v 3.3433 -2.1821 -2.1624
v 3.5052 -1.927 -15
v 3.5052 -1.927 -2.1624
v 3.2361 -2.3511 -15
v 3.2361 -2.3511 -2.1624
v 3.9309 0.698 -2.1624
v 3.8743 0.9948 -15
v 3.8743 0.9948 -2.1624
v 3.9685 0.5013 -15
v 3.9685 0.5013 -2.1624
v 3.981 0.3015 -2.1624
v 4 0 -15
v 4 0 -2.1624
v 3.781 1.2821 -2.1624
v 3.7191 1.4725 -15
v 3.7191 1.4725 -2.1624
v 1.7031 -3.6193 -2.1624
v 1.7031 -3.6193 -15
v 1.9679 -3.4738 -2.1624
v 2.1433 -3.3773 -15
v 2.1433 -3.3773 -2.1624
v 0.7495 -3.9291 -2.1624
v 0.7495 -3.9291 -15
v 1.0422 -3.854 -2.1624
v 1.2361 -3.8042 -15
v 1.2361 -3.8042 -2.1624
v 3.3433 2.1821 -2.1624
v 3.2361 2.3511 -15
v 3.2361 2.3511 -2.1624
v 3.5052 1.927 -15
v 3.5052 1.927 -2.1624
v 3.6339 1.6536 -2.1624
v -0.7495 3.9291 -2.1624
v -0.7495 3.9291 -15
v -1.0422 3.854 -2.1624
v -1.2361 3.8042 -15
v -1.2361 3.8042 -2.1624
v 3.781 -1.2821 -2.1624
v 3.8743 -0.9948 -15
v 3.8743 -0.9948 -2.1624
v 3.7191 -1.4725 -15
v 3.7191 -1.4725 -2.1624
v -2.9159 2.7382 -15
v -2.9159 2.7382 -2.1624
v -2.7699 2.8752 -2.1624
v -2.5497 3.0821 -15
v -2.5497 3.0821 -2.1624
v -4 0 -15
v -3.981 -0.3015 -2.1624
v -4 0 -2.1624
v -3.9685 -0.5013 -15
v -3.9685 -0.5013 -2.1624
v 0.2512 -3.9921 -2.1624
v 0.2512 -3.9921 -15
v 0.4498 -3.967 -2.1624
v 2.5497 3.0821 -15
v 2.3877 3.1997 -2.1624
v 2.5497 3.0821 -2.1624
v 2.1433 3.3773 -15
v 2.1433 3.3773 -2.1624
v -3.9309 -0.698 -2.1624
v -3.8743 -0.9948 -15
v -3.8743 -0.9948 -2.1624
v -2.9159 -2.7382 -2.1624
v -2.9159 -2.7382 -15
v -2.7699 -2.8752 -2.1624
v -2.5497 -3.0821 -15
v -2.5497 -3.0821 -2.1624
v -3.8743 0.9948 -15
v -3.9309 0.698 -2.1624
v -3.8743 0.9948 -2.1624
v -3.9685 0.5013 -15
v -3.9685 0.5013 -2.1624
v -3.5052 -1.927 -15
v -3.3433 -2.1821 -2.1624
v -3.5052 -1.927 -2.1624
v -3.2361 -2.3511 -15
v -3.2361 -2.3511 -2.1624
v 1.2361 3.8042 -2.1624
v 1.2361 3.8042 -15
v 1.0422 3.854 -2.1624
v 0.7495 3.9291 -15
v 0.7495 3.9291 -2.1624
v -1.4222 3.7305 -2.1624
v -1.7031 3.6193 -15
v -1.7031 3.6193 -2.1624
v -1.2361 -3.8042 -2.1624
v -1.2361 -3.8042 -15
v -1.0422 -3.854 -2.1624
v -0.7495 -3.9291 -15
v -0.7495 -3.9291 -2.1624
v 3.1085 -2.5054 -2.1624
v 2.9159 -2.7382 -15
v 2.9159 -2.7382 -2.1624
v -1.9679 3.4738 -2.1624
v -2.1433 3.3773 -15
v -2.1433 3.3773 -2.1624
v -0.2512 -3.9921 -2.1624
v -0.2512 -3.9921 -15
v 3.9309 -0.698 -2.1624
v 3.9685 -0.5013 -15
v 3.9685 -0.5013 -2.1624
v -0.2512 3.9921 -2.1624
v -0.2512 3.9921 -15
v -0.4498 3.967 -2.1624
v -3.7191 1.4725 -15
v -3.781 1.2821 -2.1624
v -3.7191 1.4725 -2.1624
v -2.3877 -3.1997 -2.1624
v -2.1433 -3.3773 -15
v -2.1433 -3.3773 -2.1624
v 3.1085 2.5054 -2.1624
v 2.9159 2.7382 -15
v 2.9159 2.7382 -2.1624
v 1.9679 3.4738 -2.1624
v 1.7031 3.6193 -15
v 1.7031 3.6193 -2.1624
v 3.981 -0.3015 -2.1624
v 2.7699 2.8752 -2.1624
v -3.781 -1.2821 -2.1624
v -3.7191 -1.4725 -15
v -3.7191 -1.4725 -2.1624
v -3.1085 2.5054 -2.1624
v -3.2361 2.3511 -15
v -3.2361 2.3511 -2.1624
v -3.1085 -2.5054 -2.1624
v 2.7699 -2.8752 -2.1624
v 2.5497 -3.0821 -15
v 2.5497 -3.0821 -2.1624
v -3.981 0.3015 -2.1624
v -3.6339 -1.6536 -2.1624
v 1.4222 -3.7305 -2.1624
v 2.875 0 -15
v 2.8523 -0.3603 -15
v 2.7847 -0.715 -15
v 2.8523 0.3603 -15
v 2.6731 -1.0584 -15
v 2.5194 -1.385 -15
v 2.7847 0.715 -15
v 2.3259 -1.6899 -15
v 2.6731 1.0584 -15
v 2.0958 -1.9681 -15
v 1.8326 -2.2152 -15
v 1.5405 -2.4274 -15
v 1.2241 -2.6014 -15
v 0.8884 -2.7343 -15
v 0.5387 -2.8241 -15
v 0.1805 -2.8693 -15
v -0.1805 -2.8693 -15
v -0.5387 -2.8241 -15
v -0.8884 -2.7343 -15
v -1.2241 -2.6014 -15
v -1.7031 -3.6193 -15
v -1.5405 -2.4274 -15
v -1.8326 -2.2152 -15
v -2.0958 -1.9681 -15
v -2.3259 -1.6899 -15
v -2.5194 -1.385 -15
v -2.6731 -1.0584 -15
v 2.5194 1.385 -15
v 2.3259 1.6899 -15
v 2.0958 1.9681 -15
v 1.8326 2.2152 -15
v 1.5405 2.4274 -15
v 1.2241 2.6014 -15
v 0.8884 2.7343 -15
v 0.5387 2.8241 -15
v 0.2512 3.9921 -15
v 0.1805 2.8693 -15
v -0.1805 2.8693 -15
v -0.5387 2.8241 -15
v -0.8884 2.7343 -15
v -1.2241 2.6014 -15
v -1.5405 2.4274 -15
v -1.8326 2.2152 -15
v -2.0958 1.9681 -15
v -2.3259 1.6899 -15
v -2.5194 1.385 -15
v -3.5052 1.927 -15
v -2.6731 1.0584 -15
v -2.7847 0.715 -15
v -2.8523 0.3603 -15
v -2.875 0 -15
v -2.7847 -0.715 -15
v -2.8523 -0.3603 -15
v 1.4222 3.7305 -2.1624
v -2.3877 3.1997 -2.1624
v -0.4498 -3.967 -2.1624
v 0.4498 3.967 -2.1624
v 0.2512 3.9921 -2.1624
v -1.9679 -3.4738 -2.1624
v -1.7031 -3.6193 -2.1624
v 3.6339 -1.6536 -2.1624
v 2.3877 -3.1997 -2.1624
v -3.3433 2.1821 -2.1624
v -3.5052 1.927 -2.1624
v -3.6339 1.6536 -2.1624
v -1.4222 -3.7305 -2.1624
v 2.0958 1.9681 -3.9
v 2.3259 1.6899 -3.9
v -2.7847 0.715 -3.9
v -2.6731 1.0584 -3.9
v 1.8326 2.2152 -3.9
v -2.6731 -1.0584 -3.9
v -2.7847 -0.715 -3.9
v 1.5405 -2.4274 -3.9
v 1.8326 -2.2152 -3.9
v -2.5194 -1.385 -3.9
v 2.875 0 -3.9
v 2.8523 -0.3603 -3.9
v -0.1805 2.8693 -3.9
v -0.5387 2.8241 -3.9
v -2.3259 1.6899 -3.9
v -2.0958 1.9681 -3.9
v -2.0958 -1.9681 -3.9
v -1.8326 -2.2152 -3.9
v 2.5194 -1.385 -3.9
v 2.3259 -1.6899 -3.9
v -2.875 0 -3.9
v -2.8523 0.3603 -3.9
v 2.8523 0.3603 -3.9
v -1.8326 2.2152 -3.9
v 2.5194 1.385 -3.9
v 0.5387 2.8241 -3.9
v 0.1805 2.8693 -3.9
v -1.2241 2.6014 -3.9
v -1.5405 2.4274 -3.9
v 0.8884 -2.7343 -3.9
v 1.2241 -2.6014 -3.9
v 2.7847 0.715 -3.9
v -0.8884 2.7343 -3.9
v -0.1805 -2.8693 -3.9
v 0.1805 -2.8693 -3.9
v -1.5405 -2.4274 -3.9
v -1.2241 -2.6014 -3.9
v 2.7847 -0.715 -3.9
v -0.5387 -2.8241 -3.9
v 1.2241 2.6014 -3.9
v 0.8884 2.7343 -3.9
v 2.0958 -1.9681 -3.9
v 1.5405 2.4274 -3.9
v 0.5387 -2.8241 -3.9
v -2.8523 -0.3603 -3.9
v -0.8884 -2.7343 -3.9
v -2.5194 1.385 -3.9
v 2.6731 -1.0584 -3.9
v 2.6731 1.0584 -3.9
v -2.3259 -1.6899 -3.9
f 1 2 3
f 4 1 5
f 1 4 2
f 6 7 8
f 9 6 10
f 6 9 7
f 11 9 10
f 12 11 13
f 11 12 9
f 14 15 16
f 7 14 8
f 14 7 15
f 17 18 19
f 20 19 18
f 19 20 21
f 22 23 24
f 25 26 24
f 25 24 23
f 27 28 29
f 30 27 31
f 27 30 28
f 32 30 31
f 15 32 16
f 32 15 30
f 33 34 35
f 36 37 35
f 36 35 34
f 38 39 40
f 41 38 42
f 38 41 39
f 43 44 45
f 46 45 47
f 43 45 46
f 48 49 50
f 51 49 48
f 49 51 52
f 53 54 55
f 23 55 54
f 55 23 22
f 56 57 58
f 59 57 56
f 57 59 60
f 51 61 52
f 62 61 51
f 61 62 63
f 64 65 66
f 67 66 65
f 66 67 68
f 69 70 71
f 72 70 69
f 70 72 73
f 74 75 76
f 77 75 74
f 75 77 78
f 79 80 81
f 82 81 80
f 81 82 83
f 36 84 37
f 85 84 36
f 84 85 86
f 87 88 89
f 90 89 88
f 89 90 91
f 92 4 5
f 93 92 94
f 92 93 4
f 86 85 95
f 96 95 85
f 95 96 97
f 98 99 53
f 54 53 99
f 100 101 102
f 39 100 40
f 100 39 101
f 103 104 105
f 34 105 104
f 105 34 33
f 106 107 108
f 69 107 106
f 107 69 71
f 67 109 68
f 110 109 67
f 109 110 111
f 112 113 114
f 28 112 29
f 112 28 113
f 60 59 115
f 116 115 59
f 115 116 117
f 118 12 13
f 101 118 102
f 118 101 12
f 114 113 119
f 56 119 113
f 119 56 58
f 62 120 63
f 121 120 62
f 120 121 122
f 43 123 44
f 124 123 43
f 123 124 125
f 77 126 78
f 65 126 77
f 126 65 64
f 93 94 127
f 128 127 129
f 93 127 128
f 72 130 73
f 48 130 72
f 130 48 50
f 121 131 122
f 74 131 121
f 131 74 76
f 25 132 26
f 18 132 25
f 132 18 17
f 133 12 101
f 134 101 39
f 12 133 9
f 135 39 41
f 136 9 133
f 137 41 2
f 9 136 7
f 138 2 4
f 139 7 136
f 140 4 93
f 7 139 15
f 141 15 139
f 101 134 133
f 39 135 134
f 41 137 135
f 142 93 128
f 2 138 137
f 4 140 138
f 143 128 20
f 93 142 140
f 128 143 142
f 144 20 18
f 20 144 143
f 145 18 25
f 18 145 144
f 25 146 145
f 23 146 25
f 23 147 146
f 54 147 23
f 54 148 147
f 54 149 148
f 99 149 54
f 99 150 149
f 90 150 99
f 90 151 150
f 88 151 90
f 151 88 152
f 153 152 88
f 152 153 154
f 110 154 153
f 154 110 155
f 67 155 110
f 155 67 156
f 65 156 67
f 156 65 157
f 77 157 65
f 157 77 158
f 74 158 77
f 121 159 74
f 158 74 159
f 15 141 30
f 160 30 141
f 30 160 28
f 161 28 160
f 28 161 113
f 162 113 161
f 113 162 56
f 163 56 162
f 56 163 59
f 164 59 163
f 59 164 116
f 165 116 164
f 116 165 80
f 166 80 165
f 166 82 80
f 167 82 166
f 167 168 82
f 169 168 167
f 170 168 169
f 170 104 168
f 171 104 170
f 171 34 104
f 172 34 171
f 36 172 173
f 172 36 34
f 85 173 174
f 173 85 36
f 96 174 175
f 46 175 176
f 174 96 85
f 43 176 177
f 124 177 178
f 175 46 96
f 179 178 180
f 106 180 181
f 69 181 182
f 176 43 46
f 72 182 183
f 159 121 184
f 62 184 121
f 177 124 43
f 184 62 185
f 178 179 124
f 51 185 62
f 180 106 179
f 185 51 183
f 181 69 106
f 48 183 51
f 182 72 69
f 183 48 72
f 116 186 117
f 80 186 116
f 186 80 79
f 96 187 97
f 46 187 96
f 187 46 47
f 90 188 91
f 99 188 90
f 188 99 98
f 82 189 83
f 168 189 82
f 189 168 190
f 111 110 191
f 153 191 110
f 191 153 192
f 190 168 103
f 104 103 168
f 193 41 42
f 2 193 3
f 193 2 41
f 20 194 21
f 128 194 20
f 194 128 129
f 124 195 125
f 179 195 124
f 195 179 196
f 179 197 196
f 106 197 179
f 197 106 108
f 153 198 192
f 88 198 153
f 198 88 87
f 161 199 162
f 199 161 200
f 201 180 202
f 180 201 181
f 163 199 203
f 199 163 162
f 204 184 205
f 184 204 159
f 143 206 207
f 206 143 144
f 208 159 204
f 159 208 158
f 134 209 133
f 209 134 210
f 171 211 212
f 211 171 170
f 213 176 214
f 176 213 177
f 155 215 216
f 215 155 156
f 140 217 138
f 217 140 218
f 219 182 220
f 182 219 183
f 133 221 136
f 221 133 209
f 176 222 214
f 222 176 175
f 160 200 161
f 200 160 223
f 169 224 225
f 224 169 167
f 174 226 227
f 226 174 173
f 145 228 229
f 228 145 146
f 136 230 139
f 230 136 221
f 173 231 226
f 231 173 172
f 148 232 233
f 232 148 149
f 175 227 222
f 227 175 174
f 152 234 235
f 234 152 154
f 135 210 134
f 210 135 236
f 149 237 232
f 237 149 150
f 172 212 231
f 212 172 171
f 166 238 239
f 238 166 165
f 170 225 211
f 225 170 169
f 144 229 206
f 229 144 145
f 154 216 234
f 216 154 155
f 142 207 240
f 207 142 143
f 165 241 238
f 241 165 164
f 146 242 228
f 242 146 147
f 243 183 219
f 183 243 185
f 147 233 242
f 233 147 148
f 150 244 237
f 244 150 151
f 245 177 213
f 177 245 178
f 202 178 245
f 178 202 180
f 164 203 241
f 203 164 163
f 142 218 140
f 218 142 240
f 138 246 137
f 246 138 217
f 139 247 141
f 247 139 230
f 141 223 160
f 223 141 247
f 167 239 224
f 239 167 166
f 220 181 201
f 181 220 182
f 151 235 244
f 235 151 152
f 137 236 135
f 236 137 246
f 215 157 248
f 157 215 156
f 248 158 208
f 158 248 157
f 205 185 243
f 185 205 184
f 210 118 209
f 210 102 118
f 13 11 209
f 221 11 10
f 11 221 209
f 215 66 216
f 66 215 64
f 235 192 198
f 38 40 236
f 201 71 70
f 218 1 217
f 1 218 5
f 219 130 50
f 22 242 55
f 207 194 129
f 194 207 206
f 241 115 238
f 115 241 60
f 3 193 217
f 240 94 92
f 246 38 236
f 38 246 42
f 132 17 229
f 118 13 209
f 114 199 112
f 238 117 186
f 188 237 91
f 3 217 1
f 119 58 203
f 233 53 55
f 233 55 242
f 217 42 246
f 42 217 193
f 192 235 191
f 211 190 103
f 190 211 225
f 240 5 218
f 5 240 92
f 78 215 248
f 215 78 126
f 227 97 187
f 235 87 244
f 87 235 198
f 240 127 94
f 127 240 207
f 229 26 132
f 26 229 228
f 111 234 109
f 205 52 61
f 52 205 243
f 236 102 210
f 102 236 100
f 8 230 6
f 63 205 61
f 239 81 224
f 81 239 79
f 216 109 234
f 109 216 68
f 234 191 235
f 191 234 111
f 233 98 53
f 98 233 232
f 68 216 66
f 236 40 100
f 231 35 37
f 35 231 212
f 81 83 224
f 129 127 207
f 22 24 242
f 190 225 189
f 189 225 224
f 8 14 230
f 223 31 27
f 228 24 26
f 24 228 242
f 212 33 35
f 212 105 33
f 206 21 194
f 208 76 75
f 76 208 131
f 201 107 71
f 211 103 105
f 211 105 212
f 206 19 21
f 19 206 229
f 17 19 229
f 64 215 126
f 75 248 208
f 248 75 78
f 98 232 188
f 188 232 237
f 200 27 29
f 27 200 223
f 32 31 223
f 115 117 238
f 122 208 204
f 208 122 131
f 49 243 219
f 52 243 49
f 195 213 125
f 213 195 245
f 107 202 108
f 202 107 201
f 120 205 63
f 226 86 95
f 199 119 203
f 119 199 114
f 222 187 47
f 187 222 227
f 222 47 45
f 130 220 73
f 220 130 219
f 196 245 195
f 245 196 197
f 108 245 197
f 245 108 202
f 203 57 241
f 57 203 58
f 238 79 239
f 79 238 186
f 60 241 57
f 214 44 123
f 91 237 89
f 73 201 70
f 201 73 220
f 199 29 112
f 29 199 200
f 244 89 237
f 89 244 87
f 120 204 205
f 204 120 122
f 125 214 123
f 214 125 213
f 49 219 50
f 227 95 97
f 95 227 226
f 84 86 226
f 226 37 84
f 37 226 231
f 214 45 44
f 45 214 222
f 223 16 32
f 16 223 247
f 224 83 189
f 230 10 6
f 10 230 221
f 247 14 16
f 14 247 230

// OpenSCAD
$fn = 50;

difference() {
	union() {
		translate(v = [0, 0, -15.0]) {
			cylinder(h = 15, r = 4.0);
		}
		#translate(v = [0, 0, -18.0]) {
			cylinder(h = 18, r = 2.875);
		}
	}
	union() {
		translate(v = [0, 0, 0]) {
			rotate(a = [0, 0, 0]) {
				difference() {
					union() {
						translate(v = [0, 0, -18.0]) {
							cylinder(h = 18, r = 2.6);
						}
						translate(v = [0, 0, -3.9]) {
							cylinder(h = 3.9, r1 = 2.875, r2 = 5.4);
						}
						translate(v = [0, 0, -18.0]) {
							cylinder(h = 18, r = 2.875);
						}
						translate(v = [0, 0, -18.0]) {
							cylinder(h = 18, r = 2.6);
						}
					}
					union();
				}
			}
		}
	}
}
